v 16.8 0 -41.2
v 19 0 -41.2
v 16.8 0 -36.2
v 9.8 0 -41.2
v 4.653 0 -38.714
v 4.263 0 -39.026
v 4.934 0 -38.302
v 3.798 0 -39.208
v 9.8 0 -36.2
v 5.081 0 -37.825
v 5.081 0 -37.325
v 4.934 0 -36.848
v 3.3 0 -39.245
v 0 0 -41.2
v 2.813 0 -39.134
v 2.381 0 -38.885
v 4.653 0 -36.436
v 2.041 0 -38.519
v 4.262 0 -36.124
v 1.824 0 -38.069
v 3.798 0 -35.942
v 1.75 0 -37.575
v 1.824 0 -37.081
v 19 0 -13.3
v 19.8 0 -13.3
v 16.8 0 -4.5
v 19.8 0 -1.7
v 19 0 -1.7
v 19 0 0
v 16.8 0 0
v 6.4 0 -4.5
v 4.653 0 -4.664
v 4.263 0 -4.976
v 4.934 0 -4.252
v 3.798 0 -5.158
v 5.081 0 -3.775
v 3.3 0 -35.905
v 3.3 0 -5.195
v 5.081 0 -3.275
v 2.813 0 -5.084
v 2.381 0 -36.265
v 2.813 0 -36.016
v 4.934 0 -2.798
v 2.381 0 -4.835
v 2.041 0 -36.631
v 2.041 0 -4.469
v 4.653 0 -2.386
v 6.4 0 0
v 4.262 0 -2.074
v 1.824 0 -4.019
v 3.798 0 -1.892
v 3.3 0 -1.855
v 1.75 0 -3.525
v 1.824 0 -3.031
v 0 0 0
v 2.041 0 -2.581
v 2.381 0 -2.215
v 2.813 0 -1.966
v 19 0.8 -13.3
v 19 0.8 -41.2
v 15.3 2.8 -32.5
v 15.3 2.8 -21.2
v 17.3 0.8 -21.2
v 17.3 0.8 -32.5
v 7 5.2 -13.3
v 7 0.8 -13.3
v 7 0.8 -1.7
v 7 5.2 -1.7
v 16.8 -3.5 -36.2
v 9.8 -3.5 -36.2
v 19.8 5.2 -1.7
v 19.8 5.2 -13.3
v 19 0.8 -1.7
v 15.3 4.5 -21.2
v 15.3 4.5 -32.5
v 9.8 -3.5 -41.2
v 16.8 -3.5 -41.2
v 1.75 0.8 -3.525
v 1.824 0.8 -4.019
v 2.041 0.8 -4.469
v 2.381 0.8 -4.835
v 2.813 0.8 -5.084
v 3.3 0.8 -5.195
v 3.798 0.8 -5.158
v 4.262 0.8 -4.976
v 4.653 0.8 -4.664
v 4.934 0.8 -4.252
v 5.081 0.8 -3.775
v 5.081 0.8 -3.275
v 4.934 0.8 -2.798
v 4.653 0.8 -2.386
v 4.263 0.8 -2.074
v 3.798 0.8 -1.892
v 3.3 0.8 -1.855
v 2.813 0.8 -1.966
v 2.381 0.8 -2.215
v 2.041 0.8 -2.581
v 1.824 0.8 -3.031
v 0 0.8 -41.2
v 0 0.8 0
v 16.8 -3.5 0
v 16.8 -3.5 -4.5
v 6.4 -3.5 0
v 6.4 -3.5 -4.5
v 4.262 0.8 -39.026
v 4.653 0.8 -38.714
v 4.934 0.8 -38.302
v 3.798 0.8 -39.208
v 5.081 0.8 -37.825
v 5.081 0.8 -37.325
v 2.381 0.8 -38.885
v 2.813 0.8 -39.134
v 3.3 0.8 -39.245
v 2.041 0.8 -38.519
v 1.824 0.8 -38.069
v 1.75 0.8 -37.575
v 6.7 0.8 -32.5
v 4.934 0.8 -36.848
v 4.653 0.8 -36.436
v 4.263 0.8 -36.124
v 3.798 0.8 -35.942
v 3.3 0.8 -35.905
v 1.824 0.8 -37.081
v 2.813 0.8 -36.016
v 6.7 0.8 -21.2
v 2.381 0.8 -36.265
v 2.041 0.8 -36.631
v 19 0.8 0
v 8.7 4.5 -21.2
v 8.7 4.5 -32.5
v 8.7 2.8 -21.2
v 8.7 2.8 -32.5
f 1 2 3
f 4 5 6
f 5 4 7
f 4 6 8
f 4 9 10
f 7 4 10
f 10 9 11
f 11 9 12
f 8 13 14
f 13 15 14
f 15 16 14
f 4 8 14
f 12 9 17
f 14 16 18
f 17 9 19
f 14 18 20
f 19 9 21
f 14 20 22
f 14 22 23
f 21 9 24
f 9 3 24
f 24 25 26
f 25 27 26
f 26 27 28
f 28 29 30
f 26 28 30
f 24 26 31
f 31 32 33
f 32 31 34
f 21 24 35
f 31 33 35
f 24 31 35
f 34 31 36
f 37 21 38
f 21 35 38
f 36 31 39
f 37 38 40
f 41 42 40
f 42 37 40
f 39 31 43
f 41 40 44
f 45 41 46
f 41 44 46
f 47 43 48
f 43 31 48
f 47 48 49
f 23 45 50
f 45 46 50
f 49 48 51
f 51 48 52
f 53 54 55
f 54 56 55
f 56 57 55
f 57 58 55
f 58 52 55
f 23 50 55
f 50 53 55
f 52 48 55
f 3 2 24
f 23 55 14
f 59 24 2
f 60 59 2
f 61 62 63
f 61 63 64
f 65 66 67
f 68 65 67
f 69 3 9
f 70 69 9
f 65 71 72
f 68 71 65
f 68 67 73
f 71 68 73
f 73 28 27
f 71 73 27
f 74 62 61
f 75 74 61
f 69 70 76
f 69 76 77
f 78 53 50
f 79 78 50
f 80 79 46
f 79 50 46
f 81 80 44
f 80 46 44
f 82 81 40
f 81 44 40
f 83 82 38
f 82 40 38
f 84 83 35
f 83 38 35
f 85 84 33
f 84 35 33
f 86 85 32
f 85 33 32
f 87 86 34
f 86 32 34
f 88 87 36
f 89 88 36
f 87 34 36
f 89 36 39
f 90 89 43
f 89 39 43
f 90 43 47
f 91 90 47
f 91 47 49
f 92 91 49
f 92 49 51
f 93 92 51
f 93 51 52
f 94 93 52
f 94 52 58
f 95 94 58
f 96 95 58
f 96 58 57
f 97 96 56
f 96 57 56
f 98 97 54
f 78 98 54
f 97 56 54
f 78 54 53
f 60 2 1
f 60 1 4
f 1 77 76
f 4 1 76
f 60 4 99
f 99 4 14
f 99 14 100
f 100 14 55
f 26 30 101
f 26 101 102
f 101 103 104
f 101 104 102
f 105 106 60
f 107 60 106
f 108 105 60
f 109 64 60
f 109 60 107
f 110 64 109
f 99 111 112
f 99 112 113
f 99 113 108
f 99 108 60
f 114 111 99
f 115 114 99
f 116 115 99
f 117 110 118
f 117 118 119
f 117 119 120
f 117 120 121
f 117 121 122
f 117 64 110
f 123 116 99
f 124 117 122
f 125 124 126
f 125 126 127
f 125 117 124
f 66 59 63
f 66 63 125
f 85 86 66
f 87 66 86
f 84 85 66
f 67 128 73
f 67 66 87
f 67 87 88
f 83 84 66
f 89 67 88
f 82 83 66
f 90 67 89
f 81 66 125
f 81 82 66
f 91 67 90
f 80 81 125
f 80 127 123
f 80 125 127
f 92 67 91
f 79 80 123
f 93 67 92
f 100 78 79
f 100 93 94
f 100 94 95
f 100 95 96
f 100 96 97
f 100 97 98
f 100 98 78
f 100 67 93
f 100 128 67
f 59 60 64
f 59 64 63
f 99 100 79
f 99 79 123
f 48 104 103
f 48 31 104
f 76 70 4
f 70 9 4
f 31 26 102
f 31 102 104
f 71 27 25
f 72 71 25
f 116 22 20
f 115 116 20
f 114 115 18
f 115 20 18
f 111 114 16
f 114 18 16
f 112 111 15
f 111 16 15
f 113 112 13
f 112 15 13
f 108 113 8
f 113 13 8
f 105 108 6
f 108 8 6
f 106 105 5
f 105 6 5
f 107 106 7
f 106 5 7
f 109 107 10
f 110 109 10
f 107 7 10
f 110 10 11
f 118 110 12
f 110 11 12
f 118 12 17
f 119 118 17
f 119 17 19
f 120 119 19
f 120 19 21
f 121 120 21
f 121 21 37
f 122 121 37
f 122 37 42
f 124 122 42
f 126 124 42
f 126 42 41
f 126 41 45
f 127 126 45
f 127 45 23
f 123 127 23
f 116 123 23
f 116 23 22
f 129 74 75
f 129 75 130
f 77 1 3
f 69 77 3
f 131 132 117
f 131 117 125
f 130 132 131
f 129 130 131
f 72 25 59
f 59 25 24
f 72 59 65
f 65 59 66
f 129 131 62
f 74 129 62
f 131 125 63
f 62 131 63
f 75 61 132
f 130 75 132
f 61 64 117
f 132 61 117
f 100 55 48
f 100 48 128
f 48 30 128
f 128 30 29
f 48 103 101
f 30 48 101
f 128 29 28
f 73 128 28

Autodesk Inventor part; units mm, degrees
ref_plane "YZ Plane" through (0, 0, 0) normal (1, 0, 0) x (0, 1, 0)
ref_plane "XZ Plane" through (0, 0, 0) normal (0, 1, 0) x (-1, 0, 0)
ref_plane "XY Plane" through (0, 0, 0) normal (0, 0, 1) x (1, 0, 0)
sketch "Sketch1" plane through (0, 0, 0) normal (0, 1, 0) x (-1, 0, 0)
  line L0 (0, 0) -> (-19, 0)
  line L1 (-19, 0) -> (-19, -41.2)
  line L2 (-19, -41.2) -> (0, -41.2)
  line L3 (0, -41.2) -> (0, 0)
  line L4 (-1.75, 0) -> (-1.75, -41.2)
  line L5 (0, -39.25) -> (-19, -39.25)
  circle A0 centre (-3.425, -3.525) radius 1.675
  circle A1 centre (-3.425, -37.575) radius 1.675
  line L6 (-8.7, -21.2) -> (-15.3, -21.2)
  line L7 (-15.3, -21.2) -> (-15.3, -32.5)
  line L8 (-15.3, -32.5) -> (-8.7, -32.5)
  line L9 (-8.7, -32.5) -> (-8.7, -21.2)
  line L10 (-7, -1.7) -> (-19.8, -1.7)
  line L11 (-19.8, -1.7) -> (-19.8, -13.3)
  line L12 (-19.8, -13.3) -> (-7, -13.3)
  line L13 (-7, -13.3) -> (-7, -1.7)
  line L14 (0, -1.85) -> (-19, -1.85)
  dimension "d0" = 19
  dimension "d1" = 41.2
  dimension "d2" = 1.75
  dimension "d4" = 1.95
  dimension "d5" = 3.35
  dimension "d6" = 3.35
  dimension "d7" = 6.6
  dimension "d8" = 11.3
  dimension "d11" = 8.7
  dimension "d12" = 8.7
  dimension "d13" = 12.8
  dimension "d14" = 11.6
  dimension "d16" = 1.7
  dimension "d27" = 1.85
  dimension "d28" = 7
extrude "Extrusion1" add sketch "Sketch1" along normal blind 0.8 contours L3 L14 L4 L0 | L4 L14 L13 L10 L1 L0 | L3 L5 L4 L14 | L4 A0 L14 | L3 L2 L4 L5 | L10 L13 L14 L1 | L4 A1 L5 L1 L12 L13 L14 A0 | L5 A1 L4 | L4 L2 L1 L5 | L14 L13 L12 L1 | L9 L8 L7 L6
extrude "Extrusion2" add sketch "Sketch1" along normal blind 5.2 contours L10 L13 L14 L1 | L1 L12 L11 L10 | L14 L13 L12 L1
extrude "Extrusion3" add sketch "Sketch1" along normal blind 4.5 contours L9 L8 L7 L6
chamfer "Chamfer1" distance 2 angle 45 2 edges at (15.3, 0.8, -26.85) (8.7, 0.8, -26.85)
sketch "Sketch2" plane through (0, 0, 0) normal (0, -1, 0) x (1, 0, 0)
  line L0 (19, 0) -> (19, -1.7) projected
  line L1 (0, 0) -> (19, 0) projected
  line L2 (0, -41.2) -> (0, 0) projected
  line L3 (19, -41.2) -> (0, -41.2) projected
  line L4 (19, -13.3) -> (19, -41.2) projected
  line L5 (19.8, -13.3) -> (19, -13.3) projected
  line L6 (19.8, -1.7) -> (19.8, -13.3) projected
  line L7 (19, -1.7) -> (19.8, -1.7) projected
  circle A0 centre (3.425, -3.525) radius 1.675 projected
  circle A1 centre (3.425, -37.575) radius 1.675 projected
  line L8 (0, -41.2) -> (19, -41.2)
  line L9 (19, -41.2) -> (19, 0)
  line L10 (19, 0) -> (0, 0)
  line L11 (0, 0) -> (0, -41.2)
  line L12 (6.4, 0) -> (16.8, 0)
  line L13 (16.8, 0) -> (16.8, -4.5)
  line L14 (16.8, -4.5) -> (6.4, -4.5)
  line L15 (6.4, -4.5) -> (6.4, 0)
  line L16 (9.8, -41.2) -> (16.8, -41.2)
  line L17 (16.8, -41.2) -> (16.8, -36.2)
  line L18 (16.8, -36.2) -> (9.8, -36.2)
  line L19 (9.8, -36.2) -> (9.8, -41.2)
  dimension "d29" = 10.4
  dimension "d30" = 4.5
  dimension "d31" = 0
  dimension "d32" = 6.4
  dimension "d33" = 7
  dimension "d34" = 5
  dimension "d35" = 2.2
  dimension "d36" = 0
extrude "Extrusion4" add sketch "Sketch2" along normal blind 3.5 contours L13 L14 L15 L1 | L3 L19 L18 L17
properties part number "interface_board"
